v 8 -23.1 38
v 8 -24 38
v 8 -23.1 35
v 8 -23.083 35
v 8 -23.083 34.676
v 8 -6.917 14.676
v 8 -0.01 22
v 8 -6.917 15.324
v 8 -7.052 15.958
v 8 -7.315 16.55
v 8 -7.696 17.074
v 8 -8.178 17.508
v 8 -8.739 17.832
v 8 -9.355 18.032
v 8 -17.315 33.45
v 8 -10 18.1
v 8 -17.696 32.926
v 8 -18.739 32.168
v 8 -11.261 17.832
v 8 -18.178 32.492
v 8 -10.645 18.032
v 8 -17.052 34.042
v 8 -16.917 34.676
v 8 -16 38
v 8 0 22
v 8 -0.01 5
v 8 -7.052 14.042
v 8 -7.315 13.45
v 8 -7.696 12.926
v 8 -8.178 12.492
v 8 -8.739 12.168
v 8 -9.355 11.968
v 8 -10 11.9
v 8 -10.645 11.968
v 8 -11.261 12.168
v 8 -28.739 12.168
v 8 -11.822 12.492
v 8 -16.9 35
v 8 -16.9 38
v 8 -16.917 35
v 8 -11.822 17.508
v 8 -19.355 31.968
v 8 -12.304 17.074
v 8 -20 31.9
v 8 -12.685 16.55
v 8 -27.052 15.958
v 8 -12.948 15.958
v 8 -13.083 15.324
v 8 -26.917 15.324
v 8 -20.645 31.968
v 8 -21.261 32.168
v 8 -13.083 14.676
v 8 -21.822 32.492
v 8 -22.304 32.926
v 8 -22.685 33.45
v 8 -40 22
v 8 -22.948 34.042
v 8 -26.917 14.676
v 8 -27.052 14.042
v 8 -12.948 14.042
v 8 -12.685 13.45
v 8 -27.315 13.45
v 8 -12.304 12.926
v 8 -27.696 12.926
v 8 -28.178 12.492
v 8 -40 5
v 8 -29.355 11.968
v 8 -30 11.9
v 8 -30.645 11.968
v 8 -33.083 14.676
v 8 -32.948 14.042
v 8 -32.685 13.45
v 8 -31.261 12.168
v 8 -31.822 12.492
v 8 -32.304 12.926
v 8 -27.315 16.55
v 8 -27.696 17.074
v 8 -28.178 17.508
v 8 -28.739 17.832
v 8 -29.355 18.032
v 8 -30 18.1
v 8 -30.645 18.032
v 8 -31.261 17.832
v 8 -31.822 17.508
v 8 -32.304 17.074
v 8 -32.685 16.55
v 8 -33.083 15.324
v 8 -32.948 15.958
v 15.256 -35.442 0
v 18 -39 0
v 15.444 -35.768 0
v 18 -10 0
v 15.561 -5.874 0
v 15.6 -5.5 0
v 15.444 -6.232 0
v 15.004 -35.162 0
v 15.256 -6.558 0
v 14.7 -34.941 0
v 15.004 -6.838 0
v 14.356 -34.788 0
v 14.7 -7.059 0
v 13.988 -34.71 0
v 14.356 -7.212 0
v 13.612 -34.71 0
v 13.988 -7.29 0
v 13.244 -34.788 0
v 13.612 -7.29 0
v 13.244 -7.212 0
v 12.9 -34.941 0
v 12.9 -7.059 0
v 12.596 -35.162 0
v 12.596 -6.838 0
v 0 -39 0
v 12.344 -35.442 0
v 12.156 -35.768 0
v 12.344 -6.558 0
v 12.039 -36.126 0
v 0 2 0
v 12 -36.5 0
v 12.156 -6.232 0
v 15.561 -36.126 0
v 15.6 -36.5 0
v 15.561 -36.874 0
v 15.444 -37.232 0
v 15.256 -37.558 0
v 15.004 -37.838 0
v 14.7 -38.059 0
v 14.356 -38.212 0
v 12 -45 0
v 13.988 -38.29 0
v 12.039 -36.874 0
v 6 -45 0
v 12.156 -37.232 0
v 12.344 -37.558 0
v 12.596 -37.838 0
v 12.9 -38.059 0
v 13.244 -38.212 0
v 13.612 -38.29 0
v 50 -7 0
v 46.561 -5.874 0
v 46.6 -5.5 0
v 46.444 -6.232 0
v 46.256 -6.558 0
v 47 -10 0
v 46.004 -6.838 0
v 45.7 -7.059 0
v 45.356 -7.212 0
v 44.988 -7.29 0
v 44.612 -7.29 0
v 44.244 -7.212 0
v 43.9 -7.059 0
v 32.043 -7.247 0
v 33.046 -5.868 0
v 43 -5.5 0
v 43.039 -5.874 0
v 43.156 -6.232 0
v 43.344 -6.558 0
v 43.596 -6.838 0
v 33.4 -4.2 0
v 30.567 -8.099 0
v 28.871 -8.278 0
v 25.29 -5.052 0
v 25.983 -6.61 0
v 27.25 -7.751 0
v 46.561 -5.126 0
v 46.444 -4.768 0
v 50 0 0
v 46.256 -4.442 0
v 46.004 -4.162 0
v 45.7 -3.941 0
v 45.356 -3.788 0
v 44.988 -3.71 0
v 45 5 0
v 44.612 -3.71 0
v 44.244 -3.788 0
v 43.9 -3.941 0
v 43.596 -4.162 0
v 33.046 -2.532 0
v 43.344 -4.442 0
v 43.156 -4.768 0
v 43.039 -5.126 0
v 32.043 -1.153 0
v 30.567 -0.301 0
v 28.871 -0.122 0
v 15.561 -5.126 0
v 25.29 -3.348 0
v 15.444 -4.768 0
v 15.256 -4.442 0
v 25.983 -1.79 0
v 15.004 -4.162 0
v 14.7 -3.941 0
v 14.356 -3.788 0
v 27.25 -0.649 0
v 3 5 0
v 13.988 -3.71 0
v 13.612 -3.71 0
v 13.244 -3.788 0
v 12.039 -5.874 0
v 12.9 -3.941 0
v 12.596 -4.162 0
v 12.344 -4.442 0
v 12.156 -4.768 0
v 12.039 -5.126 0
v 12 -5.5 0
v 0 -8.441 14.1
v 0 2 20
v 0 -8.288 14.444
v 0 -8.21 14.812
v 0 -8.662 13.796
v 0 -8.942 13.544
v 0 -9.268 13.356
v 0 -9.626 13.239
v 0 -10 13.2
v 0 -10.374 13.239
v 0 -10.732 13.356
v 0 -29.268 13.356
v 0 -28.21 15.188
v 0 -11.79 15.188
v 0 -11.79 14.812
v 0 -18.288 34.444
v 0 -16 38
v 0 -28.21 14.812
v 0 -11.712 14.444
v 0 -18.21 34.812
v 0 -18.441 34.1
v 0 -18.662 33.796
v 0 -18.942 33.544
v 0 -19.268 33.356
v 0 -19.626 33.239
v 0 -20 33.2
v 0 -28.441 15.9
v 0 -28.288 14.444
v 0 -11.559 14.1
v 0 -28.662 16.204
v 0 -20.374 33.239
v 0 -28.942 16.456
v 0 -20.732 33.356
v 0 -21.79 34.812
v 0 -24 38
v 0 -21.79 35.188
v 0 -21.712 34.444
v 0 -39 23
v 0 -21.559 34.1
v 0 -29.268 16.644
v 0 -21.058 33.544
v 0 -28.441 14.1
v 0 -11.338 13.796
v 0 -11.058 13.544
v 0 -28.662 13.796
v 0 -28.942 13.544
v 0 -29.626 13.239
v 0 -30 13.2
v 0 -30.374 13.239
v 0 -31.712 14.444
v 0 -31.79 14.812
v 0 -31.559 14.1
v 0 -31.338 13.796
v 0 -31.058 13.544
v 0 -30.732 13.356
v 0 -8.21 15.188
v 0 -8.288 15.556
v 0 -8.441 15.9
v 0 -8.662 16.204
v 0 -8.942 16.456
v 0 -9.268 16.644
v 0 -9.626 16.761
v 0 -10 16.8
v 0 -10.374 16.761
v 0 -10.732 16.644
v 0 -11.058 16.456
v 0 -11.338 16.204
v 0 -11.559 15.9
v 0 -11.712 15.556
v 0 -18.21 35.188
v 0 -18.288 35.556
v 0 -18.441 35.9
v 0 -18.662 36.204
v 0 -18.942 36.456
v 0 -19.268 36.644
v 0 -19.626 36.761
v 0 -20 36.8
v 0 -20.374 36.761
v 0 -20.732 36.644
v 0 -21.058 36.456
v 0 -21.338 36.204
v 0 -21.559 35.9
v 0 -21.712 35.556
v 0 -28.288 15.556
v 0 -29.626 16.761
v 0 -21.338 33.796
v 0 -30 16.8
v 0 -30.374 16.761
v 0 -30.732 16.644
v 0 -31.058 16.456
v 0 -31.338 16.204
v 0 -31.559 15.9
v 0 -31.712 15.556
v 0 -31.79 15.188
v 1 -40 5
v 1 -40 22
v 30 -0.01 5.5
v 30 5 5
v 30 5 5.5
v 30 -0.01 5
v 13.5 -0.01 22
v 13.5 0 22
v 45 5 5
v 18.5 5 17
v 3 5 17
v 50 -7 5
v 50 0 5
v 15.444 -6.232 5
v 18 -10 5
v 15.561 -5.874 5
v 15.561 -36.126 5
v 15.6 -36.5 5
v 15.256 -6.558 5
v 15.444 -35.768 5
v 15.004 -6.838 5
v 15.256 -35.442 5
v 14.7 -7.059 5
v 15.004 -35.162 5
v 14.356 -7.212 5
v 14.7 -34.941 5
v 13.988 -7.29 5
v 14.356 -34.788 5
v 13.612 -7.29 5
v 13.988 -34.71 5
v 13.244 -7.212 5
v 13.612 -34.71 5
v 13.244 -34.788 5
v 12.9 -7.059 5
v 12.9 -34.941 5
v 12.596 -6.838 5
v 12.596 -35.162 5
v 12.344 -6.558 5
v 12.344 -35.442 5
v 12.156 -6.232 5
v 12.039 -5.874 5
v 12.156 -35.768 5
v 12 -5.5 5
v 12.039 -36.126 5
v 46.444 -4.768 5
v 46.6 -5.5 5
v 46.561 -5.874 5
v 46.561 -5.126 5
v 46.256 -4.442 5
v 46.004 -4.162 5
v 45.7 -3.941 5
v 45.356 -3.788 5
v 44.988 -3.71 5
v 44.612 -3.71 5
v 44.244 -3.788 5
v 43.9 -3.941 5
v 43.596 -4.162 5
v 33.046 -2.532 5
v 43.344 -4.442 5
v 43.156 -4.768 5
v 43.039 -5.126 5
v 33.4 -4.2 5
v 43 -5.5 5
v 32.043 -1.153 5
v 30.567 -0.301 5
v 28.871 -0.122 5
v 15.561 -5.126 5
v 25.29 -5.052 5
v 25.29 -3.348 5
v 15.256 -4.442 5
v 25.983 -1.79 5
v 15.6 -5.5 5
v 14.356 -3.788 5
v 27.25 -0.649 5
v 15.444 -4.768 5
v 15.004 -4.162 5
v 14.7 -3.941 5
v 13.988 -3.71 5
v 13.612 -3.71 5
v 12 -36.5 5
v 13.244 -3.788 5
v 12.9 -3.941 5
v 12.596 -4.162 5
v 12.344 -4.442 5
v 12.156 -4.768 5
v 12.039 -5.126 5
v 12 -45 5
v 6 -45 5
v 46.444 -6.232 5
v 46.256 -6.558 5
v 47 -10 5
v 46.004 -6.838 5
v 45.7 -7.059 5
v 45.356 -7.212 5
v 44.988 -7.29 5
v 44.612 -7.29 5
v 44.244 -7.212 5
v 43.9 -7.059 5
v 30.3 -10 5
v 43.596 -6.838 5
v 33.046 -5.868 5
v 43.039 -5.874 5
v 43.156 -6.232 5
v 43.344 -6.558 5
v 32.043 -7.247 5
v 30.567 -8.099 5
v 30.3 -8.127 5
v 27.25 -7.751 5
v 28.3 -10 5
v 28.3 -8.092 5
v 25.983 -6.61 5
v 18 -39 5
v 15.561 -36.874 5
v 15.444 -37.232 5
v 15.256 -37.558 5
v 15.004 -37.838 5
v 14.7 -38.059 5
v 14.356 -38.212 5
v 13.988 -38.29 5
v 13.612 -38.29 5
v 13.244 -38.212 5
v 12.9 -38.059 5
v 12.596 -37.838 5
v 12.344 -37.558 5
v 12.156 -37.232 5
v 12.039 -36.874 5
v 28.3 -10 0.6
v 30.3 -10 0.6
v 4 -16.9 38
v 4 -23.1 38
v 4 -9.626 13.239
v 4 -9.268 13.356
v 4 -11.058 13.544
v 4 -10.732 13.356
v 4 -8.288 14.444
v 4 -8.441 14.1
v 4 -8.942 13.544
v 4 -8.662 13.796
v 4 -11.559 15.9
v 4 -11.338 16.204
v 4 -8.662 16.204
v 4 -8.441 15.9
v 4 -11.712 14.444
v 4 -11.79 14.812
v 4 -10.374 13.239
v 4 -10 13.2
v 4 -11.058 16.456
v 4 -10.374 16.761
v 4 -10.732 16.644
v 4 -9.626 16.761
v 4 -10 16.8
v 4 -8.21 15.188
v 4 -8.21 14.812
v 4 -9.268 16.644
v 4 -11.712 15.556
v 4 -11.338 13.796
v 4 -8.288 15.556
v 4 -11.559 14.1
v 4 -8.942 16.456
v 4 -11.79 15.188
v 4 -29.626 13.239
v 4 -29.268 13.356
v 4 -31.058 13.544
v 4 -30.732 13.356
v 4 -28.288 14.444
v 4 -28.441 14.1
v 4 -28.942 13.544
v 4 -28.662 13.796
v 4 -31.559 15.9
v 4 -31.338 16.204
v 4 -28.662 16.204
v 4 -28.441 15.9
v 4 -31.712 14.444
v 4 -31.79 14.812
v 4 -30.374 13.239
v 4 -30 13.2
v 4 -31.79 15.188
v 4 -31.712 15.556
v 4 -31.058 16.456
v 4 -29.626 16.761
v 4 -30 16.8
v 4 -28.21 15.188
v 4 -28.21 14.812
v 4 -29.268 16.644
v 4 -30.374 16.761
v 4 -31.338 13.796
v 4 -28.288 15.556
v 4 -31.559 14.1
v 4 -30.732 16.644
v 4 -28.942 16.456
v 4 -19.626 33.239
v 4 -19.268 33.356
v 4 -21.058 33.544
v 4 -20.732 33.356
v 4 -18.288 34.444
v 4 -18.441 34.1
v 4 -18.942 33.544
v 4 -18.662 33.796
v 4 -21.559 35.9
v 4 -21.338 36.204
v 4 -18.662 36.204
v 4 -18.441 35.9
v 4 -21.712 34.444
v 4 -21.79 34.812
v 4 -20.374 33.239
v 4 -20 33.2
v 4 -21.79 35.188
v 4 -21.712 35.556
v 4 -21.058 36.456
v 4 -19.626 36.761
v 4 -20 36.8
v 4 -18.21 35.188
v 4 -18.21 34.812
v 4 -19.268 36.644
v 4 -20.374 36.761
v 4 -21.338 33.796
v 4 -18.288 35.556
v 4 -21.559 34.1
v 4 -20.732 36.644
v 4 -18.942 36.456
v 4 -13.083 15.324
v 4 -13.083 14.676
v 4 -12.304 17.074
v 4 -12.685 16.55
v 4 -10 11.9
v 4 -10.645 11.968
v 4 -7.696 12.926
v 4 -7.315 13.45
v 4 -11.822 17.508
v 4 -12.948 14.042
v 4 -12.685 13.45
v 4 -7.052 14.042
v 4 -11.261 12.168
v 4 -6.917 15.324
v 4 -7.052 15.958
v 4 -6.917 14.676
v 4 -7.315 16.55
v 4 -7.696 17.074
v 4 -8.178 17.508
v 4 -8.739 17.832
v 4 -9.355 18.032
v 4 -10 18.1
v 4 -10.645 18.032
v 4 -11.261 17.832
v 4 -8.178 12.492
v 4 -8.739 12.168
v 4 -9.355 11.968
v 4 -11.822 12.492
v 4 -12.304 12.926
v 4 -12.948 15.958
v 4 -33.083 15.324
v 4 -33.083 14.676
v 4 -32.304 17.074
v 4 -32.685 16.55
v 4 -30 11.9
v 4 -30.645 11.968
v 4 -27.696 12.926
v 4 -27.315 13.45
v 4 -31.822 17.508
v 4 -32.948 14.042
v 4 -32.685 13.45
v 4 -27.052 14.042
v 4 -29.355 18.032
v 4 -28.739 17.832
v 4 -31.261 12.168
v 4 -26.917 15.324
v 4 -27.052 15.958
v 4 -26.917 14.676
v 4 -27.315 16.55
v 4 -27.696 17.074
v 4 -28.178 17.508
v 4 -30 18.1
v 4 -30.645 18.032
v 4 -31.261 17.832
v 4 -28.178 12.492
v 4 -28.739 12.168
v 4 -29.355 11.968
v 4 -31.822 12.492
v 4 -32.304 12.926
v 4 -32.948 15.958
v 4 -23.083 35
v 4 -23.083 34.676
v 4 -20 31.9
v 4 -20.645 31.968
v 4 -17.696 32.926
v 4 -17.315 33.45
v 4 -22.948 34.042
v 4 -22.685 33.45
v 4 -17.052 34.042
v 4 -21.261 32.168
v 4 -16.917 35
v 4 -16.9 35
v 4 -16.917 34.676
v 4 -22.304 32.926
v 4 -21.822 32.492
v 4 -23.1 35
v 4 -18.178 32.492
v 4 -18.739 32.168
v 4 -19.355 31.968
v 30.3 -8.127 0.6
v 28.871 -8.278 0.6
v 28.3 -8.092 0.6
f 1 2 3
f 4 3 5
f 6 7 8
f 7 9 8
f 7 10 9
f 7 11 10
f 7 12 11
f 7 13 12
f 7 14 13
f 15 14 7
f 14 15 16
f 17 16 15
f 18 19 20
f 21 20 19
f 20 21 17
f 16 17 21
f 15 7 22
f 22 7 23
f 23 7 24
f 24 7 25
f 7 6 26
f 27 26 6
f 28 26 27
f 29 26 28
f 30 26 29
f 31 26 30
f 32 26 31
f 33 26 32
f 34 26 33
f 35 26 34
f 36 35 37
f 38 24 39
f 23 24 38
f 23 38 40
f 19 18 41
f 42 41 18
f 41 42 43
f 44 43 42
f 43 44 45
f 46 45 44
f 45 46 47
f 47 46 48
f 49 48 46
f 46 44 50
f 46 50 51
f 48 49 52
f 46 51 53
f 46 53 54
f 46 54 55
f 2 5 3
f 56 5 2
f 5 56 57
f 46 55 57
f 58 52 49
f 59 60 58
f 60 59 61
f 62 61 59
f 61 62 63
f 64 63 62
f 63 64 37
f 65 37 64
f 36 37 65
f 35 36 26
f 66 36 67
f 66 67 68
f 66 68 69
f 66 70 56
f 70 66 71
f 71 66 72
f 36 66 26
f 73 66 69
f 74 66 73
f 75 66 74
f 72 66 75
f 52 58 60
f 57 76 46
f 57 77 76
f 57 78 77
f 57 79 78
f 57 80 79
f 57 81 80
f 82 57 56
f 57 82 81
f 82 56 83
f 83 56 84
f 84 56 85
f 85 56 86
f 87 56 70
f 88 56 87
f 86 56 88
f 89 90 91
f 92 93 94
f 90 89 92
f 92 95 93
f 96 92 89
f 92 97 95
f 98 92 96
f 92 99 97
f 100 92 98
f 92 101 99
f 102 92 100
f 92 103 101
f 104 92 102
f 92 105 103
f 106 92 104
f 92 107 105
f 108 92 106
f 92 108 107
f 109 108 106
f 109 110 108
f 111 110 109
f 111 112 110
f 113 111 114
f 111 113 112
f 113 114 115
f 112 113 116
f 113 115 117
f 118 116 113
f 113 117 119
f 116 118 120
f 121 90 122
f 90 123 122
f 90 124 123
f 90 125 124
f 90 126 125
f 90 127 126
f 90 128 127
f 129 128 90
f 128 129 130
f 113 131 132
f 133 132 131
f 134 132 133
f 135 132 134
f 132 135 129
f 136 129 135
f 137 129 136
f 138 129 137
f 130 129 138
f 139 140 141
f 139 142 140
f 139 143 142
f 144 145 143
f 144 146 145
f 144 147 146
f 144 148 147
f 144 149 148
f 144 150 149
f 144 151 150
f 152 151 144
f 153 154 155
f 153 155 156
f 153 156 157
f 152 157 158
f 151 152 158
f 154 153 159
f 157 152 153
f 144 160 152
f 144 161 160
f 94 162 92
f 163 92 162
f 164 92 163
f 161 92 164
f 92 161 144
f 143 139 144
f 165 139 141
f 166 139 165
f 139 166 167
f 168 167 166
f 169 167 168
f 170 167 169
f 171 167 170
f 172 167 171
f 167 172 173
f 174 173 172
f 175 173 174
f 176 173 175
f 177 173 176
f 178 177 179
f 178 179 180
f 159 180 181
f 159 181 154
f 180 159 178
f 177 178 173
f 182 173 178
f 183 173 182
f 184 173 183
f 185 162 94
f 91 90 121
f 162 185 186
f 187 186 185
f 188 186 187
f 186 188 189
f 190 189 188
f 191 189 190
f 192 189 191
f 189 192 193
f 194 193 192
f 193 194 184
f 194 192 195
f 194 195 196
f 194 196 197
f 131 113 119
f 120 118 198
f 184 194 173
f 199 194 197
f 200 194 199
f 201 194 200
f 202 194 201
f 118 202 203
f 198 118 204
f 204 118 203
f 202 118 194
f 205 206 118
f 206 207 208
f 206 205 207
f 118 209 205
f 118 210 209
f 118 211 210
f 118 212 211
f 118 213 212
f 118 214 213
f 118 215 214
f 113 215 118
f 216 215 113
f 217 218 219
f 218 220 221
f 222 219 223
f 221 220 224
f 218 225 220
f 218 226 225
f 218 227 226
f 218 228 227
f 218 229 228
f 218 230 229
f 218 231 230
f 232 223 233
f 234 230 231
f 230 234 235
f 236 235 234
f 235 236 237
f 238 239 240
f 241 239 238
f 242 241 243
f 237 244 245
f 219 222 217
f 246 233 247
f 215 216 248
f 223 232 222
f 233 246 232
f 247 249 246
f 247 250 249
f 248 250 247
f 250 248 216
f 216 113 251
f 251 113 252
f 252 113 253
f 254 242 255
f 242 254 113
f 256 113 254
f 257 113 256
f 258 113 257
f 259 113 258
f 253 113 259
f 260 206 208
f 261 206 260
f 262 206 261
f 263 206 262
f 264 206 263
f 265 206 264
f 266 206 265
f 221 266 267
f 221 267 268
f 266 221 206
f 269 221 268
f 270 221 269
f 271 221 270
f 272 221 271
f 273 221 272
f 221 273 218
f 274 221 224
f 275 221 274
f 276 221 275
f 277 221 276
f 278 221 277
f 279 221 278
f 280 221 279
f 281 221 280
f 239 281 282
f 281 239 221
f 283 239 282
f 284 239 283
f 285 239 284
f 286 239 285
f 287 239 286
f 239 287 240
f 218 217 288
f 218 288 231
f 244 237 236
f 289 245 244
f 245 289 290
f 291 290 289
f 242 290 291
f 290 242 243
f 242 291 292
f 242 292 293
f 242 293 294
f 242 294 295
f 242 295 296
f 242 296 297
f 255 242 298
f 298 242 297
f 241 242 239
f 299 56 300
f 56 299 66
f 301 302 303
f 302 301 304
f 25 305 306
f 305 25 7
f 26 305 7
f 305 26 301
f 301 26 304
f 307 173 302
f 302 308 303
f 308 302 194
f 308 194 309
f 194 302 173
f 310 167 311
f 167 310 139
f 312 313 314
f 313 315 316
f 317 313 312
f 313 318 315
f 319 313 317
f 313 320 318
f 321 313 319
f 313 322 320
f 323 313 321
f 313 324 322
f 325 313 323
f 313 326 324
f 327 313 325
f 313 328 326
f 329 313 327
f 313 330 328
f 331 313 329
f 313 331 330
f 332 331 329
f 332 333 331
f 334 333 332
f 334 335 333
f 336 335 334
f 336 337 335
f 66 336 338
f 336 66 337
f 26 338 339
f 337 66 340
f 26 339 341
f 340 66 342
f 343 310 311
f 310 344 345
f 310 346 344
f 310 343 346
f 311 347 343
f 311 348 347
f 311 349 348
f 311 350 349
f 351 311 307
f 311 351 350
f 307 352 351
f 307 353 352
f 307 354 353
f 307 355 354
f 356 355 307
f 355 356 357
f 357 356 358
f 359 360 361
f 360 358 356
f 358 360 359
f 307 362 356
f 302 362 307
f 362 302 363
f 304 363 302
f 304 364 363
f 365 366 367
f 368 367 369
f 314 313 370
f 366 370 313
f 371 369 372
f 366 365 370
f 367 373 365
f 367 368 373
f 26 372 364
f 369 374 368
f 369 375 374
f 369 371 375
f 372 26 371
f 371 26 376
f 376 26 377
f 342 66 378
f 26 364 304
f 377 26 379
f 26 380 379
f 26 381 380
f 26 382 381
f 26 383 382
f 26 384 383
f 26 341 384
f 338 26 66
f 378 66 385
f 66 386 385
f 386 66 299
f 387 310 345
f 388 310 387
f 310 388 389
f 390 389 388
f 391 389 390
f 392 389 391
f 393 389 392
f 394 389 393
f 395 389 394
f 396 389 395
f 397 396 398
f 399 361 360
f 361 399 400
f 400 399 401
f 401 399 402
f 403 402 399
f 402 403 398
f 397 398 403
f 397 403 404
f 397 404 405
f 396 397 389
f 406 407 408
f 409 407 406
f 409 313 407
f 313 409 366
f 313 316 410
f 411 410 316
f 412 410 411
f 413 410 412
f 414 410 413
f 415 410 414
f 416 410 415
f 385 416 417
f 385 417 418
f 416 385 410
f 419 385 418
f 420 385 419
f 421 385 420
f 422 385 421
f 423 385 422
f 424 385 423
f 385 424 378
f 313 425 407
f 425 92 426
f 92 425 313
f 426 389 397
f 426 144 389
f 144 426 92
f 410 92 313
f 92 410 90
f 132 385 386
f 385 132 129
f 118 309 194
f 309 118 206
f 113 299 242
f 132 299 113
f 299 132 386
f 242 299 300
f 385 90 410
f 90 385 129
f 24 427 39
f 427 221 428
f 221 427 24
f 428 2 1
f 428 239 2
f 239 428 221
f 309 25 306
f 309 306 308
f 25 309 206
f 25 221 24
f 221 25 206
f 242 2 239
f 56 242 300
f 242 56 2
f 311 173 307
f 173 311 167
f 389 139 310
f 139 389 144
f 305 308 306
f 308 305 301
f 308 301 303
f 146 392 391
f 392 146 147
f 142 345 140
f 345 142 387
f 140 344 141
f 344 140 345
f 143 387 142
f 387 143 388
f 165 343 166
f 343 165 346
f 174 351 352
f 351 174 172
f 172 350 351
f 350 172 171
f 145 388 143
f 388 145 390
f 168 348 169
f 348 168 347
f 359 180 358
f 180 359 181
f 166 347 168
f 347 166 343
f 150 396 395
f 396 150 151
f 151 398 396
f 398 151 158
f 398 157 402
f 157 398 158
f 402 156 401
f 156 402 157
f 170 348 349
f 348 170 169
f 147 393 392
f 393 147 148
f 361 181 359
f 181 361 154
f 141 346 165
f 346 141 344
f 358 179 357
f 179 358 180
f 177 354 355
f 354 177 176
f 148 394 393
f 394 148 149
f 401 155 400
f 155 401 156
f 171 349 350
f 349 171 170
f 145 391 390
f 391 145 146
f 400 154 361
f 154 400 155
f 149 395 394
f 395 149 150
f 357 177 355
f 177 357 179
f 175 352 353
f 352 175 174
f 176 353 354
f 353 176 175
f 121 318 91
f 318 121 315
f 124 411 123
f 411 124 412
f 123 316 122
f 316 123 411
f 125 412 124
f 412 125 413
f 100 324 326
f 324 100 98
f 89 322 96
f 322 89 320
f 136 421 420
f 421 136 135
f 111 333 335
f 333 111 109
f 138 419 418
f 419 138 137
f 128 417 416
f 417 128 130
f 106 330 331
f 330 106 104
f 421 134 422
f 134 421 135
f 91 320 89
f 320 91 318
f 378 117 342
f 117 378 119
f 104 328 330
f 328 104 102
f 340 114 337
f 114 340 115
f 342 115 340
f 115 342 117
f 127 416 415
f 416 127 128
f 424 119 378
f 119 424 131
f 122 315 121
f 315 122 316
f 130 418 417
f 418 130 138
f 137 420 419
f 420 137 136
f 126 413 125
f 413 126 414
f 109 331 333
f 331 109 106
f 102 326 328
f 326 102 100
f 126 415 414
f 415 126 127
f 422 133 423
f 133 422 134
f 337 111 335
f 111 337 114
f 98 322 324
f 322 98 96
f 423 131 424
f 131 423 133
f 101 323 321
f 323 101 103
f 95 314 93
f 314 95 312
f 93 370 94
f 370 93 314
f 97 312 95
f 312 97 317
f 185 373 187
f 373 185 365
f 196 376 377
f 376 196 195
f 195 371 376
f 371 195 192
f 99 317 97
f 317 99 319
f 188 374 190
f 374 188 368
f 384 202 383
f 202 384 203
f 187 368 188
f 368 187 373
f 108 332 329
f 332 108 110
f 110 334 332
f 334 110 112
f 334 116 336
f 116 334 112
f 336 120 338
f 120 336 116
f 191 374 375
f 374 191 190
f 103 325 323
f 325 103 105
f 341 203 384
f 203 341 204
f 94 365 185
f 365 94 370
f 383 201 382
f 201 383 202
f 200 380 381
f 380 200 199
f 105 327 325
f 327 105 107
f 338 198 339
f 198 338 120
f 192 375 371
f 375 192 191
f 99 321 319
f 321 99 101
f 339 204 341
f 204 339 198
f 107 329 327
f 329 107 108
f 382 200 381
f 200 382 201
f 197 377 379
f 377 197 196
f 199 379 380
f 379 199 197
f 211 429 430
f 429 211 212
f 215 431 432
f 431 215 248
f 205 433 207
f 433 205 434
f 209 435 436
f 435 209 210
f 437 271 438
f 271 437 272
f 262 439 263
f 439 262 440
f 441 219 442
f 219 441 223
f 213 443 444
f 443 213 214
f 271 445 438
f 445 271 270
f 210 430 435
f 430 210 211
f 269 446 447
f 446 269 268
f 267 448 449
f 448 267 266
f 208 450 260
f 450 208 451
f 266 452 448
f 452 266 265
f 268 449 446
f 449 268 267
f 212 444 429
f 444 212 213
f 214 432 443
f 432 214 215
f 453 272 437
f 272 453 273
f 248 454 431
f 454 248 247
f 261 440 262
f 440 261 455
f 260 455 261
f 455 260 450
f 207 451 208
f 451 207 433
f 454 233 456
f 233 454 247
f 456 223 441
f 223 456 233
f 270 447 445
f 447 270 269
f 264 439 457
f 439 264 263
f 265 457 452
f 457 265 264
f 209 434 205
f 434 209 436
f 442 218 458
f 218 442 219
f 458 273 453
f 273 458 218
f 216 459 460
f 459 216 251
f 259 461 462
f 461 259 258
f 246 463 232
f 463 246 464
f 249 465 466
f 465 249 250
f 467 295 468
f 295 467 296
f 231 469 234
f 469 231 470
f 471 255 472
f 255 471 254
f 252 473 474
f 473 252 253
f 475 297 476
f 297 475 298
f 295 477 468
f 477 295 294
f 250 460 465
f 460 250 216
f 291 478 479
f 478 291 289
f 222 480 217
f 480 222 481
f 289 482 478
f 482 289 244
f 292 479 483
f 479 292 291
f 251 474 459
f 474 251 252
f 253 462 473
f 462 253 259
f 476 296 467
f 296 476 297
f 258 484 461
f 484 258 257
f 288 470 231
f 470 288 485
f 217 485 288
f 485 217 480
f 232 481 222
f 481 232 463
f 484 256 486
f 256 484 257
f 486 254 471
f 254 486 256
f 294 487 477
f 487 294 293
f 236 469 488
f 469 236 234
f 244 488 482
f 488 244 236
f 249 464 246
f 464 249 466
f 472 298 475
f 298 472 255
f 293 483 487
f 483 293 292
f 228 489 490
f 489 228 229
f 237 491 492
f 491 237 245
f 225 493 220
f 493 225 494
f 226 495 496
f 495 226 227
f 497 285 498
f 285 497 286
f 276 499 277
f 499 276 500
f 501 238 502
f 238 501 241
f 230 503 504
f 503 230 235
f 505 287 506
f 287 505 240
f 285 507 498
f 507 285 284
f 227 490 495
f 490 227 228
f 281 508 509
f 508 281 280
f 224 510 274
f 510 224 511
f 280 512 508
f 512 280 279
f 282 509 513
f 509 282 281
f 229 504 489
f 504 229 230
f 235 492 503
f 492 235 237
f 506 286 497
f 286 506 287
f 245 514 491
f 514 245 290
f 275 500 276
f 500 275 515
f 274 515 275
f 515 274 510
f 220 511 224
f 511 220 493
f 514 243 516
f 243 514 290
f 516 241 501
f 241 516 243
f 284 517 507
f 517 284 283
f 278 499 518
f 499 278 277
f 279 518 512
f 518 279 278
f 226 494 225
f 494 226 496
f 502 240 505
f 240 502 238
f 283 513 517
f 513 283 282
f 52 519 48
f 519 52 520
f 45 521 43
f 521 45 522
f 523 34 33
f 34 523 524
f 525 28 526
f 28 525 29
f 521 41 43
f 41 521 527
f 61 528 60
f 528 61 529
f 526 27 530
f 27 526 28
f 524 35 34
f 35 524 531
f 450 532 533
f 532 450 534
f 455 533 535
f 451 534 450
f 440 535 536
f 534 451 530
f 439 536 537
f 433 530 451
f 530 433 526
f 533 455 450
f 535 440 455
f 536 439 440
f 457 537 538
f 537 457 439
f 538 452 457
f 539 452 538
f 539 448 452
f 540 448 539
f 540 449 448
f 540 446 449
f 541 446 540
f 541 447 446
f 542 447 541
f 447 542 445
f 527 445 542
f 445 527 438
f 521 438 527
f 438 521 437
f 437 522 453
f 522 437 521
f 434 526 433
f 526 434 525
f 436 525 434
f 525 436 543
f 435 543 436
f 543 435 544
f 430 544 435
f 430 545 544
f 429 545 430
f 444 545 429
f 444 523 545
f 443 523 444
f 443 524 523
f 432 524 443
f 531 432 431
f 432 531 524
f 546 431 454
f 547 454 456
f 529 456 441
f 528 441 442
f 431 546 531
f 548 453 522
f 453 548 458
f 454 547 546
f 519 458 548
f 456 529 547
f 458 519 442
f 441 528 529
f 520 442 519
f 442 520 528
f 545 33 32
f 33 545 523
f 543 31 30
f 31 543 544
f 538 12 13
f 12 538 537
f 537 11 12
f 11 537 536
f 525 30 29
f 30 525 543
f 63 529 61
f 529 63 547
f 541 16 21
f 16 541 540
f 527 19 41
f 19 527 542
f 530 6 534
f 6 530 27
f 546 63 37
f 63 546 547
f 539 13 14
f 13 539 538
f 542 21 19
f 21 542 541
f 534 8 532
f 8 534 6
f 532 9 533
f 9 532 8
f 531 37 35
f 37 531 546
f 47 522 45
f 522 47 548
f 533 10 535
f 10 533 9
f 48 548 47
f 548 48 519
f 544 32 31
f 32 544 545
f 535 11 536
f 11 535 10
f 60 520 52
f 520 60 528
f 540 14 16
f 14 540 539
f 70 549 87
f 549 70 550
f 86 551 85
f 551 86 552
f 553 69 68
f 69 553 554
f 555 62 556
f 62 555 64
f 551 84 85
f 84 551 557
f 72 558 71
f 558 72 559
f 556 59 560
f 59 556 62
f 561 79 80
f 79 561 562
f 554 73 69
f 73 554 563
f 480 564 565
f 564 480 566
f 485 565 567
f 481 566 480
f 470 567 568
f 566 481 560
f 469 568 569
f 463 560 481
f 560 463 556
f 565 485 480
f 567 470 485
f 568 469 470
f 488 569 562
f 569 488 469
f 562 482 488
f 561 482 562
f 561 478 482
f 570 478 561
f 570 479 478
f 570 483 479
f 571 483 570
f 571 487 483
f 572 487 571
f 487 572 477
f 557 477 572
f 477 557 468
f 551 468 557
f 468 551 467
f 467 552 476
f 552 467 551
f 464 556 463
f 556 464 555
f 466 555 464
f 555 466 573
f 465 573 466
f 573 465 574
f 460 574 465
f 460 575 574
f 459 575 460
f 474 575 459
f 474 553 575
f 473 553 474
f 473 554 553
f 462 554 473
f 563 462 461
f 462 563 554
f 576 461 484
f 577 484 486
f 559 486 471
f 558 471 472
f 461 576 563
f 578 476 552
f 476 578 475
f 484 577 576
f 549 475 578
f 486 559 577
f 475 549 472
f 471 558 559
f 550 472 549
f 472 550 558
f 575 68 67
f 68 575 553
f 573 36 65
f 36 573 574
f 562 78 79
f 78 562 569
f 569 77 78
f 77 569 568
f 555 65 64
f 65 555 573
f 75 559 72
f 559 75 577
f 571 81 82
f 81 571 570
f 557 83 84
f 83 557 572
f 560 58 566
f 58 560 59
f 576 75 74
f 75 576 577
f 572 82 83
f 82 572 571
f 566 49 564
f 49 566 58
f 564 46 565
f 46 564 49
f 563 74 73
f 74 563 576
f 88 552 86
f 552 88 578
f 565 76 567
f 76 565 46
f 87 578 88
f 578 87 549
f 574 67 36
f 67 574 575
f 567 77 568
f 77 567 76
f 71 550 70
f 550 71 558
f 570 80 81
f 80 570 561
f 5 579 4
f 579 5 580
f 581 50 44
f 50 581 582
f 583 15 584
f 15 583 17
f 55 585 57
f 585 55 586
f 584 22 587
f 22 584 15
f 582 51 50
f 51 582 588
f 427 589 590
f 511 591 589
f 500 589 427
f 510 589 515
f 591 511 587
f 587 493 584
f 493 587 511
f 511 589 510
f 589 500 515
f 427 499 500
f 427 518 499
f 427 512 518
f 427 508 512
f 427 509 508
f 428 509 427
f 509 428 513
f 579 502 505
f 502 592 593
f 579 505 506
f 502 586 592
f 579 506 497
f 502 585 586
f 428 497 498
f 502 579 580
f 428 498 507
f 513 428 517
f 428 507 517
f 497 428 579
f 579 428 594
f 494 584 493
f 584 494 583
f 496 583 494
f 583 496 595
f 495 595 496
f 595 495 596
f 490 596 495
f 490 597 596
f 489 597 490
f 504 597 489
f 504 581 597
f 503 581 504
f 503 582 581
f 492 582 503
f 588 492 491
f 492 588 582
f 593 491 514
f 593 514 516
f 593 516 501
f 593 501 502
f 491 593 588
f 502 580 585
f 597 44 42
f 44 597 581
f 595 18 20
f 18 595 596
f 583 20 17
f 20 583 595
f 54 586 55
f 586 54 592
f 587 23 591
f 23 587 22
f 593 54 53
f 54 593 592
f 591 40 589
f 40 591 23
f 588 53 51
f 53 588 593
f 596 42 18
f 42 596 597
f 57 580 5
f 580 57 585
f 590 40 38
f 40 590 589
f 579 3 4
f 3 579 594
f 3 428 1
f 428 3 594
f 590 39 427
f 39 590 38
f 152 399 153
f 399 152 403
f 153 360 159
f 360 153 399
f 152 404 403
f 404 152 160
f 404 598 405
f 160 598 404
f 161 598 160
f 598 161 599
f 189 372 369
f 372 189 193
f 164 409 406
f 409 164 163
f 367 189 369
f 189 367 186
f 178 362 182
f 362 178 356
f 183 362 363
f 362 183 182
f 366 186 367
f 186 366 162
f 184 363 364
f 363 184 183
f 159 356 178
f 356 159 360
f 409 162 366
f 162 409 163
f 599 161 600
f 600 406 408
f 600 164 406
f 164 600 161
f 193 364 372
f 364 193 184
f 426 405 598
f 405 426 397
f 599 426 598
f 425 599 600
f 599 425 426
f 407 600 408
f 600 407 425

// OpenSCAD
// PRUSA iteration3
// Z axis bottom holder
// GNU GPL v3
// Josef Průša <iam@josefprusa.cz> and contributors
// http://www.reprap.org/wiki/Prusa_Mendel
// http://prusamendel.org

module z_bottom_base(){
 translate([0,0,0]) cube([8,40,16+25]); // plate touching the base
 translate([0,-5,0]) cube([30,5.01,22]); // plate touching the base
 translate([0,-5,0]) cube([50,15,5]); // plate touching the base
 translate([0,-5,0]) cube([18,50,5]);
}

module z_bottom_fancy(){
 // corner cutouts
 translate([0.5,-2.5,0]) rotate([0,0,-45-180]) translate([-15,0,-1]) cube([30,30,51]);
 translate([0.5,40-0.5,0]) rotate([0,0,-45+90]) translate([-15,0,-1]) cube([30,30,51]);
 //translate([-4,40+5,5]) rotate([0,0,-35-0]) translate([0,0,0.1]) cube([30,30,51]);
 translate([-4+11,40+5+5,0]) rotate([0,0,-45-0]) translate([0,0,-1]) cube([30,30,51]);
 translate([8,0,12+20+6]) rotate([0,-90,0]) translate([0,-5,0]) cube([30,50,30]);
 translate([20,-2,12+8]) rotate([45,0,0]) rotate([0,-90,0]) translate([0,-5,0]) cube([30,50,30]);
 translate([8,20,12+30]) rotate([-45,0,0]) rotate([0,-90,0]) translate([0,-5,0]) cube([30,50,30]);
 translate([50-2.5,-5+2.5,0]) rotate([0,0,-45-90]) translate([-15,0,-1]) cube([30,30,51]);
 translate([50-1.5,10-1.5,0]) rotate([0,0,-45]) translate([-15,0,-1]) cube([30,30,51]);
 //translate([0,0,5]) rotate([45+180,0,0]) rotate([0,0,-45+90]) translate([0,0,-15]) cube([30,30,30]);
 // Stiffner cut out
 translate([30,0,5.5]) rotate([0,-45,0]) translate([0,-5,0]) cube([30,50,30]);
}

module z_bottom_holes(){
 // Frame mounting screw holes
 translate([-1,10,10+5]) rotate([0,90,0]) cylinder(h = 20, r=1.8, $fn=30);
 translate([-1,10+20,10+5]) rotate([0,90,0]) cylinder(h = 20, r=1.8, $fn=30);
 translate([-1,10+10,10+20+5]) rotate([0,90,0]) cylinder(h = 20, r=1.8, $fn=30);

 // Frame mounting screw head holes
 translate([4,10,10+5]) rotate([0,90,0]) cylinder(h = 20, r=3.1, $fn=30);
 translate([4,10+20,10+5]) rotate([0,90,0]) cylinder(h = 20, r=3.1, $fn=30);
 translate([4,10+10,10+20+5]) rotate([0,90,0]) cylinder(h = 20, r=3.1, $fn=30);
 translate([4,10+10-3.1,10+20+5]) cube([10,6.2,10]);

 // Z rod holder
 translate([25+4.3,4.2,-1]) rotate([0,0,0]) cylinder(h = 50, r=4.1, $fn=15);
 translate([25+4.3-1,3,0.6]) cube([2,10,7]); // it's bit up because it helps with printing

 // motor mounting
 translate([25+4.3,21,-1]){
 //translate([15.5,15.5,-1]) cylinder(h = 20, r=1.8, $fn=30);
 
 translate([15.5,-15.5,-1]) cylinder(h = 20, r=1.8, $fn=30);
 translate([-15.5,15.5,-1]) cylinder(h = 20, r=1.8, $fn=30);
 translate([-15.5,-15.5,-1]) cylinder(h = 20, r=1.8, $fn=30);
 }

}

// Final part
module z_bottom_holder(){
 difference(){
  z_bottom_base();
  z_bottom_fancy();
  z_bottom_holes();
 }
 *translate([0,-13,0]) mirror([0,1,0]) difference(){
  z_bottom_base();
  z_bottom_fancy();
  z_bottom_holes();
 }
}

//z_bottom_holder();
mirror([0,1,0]) z_bottom_holder();
